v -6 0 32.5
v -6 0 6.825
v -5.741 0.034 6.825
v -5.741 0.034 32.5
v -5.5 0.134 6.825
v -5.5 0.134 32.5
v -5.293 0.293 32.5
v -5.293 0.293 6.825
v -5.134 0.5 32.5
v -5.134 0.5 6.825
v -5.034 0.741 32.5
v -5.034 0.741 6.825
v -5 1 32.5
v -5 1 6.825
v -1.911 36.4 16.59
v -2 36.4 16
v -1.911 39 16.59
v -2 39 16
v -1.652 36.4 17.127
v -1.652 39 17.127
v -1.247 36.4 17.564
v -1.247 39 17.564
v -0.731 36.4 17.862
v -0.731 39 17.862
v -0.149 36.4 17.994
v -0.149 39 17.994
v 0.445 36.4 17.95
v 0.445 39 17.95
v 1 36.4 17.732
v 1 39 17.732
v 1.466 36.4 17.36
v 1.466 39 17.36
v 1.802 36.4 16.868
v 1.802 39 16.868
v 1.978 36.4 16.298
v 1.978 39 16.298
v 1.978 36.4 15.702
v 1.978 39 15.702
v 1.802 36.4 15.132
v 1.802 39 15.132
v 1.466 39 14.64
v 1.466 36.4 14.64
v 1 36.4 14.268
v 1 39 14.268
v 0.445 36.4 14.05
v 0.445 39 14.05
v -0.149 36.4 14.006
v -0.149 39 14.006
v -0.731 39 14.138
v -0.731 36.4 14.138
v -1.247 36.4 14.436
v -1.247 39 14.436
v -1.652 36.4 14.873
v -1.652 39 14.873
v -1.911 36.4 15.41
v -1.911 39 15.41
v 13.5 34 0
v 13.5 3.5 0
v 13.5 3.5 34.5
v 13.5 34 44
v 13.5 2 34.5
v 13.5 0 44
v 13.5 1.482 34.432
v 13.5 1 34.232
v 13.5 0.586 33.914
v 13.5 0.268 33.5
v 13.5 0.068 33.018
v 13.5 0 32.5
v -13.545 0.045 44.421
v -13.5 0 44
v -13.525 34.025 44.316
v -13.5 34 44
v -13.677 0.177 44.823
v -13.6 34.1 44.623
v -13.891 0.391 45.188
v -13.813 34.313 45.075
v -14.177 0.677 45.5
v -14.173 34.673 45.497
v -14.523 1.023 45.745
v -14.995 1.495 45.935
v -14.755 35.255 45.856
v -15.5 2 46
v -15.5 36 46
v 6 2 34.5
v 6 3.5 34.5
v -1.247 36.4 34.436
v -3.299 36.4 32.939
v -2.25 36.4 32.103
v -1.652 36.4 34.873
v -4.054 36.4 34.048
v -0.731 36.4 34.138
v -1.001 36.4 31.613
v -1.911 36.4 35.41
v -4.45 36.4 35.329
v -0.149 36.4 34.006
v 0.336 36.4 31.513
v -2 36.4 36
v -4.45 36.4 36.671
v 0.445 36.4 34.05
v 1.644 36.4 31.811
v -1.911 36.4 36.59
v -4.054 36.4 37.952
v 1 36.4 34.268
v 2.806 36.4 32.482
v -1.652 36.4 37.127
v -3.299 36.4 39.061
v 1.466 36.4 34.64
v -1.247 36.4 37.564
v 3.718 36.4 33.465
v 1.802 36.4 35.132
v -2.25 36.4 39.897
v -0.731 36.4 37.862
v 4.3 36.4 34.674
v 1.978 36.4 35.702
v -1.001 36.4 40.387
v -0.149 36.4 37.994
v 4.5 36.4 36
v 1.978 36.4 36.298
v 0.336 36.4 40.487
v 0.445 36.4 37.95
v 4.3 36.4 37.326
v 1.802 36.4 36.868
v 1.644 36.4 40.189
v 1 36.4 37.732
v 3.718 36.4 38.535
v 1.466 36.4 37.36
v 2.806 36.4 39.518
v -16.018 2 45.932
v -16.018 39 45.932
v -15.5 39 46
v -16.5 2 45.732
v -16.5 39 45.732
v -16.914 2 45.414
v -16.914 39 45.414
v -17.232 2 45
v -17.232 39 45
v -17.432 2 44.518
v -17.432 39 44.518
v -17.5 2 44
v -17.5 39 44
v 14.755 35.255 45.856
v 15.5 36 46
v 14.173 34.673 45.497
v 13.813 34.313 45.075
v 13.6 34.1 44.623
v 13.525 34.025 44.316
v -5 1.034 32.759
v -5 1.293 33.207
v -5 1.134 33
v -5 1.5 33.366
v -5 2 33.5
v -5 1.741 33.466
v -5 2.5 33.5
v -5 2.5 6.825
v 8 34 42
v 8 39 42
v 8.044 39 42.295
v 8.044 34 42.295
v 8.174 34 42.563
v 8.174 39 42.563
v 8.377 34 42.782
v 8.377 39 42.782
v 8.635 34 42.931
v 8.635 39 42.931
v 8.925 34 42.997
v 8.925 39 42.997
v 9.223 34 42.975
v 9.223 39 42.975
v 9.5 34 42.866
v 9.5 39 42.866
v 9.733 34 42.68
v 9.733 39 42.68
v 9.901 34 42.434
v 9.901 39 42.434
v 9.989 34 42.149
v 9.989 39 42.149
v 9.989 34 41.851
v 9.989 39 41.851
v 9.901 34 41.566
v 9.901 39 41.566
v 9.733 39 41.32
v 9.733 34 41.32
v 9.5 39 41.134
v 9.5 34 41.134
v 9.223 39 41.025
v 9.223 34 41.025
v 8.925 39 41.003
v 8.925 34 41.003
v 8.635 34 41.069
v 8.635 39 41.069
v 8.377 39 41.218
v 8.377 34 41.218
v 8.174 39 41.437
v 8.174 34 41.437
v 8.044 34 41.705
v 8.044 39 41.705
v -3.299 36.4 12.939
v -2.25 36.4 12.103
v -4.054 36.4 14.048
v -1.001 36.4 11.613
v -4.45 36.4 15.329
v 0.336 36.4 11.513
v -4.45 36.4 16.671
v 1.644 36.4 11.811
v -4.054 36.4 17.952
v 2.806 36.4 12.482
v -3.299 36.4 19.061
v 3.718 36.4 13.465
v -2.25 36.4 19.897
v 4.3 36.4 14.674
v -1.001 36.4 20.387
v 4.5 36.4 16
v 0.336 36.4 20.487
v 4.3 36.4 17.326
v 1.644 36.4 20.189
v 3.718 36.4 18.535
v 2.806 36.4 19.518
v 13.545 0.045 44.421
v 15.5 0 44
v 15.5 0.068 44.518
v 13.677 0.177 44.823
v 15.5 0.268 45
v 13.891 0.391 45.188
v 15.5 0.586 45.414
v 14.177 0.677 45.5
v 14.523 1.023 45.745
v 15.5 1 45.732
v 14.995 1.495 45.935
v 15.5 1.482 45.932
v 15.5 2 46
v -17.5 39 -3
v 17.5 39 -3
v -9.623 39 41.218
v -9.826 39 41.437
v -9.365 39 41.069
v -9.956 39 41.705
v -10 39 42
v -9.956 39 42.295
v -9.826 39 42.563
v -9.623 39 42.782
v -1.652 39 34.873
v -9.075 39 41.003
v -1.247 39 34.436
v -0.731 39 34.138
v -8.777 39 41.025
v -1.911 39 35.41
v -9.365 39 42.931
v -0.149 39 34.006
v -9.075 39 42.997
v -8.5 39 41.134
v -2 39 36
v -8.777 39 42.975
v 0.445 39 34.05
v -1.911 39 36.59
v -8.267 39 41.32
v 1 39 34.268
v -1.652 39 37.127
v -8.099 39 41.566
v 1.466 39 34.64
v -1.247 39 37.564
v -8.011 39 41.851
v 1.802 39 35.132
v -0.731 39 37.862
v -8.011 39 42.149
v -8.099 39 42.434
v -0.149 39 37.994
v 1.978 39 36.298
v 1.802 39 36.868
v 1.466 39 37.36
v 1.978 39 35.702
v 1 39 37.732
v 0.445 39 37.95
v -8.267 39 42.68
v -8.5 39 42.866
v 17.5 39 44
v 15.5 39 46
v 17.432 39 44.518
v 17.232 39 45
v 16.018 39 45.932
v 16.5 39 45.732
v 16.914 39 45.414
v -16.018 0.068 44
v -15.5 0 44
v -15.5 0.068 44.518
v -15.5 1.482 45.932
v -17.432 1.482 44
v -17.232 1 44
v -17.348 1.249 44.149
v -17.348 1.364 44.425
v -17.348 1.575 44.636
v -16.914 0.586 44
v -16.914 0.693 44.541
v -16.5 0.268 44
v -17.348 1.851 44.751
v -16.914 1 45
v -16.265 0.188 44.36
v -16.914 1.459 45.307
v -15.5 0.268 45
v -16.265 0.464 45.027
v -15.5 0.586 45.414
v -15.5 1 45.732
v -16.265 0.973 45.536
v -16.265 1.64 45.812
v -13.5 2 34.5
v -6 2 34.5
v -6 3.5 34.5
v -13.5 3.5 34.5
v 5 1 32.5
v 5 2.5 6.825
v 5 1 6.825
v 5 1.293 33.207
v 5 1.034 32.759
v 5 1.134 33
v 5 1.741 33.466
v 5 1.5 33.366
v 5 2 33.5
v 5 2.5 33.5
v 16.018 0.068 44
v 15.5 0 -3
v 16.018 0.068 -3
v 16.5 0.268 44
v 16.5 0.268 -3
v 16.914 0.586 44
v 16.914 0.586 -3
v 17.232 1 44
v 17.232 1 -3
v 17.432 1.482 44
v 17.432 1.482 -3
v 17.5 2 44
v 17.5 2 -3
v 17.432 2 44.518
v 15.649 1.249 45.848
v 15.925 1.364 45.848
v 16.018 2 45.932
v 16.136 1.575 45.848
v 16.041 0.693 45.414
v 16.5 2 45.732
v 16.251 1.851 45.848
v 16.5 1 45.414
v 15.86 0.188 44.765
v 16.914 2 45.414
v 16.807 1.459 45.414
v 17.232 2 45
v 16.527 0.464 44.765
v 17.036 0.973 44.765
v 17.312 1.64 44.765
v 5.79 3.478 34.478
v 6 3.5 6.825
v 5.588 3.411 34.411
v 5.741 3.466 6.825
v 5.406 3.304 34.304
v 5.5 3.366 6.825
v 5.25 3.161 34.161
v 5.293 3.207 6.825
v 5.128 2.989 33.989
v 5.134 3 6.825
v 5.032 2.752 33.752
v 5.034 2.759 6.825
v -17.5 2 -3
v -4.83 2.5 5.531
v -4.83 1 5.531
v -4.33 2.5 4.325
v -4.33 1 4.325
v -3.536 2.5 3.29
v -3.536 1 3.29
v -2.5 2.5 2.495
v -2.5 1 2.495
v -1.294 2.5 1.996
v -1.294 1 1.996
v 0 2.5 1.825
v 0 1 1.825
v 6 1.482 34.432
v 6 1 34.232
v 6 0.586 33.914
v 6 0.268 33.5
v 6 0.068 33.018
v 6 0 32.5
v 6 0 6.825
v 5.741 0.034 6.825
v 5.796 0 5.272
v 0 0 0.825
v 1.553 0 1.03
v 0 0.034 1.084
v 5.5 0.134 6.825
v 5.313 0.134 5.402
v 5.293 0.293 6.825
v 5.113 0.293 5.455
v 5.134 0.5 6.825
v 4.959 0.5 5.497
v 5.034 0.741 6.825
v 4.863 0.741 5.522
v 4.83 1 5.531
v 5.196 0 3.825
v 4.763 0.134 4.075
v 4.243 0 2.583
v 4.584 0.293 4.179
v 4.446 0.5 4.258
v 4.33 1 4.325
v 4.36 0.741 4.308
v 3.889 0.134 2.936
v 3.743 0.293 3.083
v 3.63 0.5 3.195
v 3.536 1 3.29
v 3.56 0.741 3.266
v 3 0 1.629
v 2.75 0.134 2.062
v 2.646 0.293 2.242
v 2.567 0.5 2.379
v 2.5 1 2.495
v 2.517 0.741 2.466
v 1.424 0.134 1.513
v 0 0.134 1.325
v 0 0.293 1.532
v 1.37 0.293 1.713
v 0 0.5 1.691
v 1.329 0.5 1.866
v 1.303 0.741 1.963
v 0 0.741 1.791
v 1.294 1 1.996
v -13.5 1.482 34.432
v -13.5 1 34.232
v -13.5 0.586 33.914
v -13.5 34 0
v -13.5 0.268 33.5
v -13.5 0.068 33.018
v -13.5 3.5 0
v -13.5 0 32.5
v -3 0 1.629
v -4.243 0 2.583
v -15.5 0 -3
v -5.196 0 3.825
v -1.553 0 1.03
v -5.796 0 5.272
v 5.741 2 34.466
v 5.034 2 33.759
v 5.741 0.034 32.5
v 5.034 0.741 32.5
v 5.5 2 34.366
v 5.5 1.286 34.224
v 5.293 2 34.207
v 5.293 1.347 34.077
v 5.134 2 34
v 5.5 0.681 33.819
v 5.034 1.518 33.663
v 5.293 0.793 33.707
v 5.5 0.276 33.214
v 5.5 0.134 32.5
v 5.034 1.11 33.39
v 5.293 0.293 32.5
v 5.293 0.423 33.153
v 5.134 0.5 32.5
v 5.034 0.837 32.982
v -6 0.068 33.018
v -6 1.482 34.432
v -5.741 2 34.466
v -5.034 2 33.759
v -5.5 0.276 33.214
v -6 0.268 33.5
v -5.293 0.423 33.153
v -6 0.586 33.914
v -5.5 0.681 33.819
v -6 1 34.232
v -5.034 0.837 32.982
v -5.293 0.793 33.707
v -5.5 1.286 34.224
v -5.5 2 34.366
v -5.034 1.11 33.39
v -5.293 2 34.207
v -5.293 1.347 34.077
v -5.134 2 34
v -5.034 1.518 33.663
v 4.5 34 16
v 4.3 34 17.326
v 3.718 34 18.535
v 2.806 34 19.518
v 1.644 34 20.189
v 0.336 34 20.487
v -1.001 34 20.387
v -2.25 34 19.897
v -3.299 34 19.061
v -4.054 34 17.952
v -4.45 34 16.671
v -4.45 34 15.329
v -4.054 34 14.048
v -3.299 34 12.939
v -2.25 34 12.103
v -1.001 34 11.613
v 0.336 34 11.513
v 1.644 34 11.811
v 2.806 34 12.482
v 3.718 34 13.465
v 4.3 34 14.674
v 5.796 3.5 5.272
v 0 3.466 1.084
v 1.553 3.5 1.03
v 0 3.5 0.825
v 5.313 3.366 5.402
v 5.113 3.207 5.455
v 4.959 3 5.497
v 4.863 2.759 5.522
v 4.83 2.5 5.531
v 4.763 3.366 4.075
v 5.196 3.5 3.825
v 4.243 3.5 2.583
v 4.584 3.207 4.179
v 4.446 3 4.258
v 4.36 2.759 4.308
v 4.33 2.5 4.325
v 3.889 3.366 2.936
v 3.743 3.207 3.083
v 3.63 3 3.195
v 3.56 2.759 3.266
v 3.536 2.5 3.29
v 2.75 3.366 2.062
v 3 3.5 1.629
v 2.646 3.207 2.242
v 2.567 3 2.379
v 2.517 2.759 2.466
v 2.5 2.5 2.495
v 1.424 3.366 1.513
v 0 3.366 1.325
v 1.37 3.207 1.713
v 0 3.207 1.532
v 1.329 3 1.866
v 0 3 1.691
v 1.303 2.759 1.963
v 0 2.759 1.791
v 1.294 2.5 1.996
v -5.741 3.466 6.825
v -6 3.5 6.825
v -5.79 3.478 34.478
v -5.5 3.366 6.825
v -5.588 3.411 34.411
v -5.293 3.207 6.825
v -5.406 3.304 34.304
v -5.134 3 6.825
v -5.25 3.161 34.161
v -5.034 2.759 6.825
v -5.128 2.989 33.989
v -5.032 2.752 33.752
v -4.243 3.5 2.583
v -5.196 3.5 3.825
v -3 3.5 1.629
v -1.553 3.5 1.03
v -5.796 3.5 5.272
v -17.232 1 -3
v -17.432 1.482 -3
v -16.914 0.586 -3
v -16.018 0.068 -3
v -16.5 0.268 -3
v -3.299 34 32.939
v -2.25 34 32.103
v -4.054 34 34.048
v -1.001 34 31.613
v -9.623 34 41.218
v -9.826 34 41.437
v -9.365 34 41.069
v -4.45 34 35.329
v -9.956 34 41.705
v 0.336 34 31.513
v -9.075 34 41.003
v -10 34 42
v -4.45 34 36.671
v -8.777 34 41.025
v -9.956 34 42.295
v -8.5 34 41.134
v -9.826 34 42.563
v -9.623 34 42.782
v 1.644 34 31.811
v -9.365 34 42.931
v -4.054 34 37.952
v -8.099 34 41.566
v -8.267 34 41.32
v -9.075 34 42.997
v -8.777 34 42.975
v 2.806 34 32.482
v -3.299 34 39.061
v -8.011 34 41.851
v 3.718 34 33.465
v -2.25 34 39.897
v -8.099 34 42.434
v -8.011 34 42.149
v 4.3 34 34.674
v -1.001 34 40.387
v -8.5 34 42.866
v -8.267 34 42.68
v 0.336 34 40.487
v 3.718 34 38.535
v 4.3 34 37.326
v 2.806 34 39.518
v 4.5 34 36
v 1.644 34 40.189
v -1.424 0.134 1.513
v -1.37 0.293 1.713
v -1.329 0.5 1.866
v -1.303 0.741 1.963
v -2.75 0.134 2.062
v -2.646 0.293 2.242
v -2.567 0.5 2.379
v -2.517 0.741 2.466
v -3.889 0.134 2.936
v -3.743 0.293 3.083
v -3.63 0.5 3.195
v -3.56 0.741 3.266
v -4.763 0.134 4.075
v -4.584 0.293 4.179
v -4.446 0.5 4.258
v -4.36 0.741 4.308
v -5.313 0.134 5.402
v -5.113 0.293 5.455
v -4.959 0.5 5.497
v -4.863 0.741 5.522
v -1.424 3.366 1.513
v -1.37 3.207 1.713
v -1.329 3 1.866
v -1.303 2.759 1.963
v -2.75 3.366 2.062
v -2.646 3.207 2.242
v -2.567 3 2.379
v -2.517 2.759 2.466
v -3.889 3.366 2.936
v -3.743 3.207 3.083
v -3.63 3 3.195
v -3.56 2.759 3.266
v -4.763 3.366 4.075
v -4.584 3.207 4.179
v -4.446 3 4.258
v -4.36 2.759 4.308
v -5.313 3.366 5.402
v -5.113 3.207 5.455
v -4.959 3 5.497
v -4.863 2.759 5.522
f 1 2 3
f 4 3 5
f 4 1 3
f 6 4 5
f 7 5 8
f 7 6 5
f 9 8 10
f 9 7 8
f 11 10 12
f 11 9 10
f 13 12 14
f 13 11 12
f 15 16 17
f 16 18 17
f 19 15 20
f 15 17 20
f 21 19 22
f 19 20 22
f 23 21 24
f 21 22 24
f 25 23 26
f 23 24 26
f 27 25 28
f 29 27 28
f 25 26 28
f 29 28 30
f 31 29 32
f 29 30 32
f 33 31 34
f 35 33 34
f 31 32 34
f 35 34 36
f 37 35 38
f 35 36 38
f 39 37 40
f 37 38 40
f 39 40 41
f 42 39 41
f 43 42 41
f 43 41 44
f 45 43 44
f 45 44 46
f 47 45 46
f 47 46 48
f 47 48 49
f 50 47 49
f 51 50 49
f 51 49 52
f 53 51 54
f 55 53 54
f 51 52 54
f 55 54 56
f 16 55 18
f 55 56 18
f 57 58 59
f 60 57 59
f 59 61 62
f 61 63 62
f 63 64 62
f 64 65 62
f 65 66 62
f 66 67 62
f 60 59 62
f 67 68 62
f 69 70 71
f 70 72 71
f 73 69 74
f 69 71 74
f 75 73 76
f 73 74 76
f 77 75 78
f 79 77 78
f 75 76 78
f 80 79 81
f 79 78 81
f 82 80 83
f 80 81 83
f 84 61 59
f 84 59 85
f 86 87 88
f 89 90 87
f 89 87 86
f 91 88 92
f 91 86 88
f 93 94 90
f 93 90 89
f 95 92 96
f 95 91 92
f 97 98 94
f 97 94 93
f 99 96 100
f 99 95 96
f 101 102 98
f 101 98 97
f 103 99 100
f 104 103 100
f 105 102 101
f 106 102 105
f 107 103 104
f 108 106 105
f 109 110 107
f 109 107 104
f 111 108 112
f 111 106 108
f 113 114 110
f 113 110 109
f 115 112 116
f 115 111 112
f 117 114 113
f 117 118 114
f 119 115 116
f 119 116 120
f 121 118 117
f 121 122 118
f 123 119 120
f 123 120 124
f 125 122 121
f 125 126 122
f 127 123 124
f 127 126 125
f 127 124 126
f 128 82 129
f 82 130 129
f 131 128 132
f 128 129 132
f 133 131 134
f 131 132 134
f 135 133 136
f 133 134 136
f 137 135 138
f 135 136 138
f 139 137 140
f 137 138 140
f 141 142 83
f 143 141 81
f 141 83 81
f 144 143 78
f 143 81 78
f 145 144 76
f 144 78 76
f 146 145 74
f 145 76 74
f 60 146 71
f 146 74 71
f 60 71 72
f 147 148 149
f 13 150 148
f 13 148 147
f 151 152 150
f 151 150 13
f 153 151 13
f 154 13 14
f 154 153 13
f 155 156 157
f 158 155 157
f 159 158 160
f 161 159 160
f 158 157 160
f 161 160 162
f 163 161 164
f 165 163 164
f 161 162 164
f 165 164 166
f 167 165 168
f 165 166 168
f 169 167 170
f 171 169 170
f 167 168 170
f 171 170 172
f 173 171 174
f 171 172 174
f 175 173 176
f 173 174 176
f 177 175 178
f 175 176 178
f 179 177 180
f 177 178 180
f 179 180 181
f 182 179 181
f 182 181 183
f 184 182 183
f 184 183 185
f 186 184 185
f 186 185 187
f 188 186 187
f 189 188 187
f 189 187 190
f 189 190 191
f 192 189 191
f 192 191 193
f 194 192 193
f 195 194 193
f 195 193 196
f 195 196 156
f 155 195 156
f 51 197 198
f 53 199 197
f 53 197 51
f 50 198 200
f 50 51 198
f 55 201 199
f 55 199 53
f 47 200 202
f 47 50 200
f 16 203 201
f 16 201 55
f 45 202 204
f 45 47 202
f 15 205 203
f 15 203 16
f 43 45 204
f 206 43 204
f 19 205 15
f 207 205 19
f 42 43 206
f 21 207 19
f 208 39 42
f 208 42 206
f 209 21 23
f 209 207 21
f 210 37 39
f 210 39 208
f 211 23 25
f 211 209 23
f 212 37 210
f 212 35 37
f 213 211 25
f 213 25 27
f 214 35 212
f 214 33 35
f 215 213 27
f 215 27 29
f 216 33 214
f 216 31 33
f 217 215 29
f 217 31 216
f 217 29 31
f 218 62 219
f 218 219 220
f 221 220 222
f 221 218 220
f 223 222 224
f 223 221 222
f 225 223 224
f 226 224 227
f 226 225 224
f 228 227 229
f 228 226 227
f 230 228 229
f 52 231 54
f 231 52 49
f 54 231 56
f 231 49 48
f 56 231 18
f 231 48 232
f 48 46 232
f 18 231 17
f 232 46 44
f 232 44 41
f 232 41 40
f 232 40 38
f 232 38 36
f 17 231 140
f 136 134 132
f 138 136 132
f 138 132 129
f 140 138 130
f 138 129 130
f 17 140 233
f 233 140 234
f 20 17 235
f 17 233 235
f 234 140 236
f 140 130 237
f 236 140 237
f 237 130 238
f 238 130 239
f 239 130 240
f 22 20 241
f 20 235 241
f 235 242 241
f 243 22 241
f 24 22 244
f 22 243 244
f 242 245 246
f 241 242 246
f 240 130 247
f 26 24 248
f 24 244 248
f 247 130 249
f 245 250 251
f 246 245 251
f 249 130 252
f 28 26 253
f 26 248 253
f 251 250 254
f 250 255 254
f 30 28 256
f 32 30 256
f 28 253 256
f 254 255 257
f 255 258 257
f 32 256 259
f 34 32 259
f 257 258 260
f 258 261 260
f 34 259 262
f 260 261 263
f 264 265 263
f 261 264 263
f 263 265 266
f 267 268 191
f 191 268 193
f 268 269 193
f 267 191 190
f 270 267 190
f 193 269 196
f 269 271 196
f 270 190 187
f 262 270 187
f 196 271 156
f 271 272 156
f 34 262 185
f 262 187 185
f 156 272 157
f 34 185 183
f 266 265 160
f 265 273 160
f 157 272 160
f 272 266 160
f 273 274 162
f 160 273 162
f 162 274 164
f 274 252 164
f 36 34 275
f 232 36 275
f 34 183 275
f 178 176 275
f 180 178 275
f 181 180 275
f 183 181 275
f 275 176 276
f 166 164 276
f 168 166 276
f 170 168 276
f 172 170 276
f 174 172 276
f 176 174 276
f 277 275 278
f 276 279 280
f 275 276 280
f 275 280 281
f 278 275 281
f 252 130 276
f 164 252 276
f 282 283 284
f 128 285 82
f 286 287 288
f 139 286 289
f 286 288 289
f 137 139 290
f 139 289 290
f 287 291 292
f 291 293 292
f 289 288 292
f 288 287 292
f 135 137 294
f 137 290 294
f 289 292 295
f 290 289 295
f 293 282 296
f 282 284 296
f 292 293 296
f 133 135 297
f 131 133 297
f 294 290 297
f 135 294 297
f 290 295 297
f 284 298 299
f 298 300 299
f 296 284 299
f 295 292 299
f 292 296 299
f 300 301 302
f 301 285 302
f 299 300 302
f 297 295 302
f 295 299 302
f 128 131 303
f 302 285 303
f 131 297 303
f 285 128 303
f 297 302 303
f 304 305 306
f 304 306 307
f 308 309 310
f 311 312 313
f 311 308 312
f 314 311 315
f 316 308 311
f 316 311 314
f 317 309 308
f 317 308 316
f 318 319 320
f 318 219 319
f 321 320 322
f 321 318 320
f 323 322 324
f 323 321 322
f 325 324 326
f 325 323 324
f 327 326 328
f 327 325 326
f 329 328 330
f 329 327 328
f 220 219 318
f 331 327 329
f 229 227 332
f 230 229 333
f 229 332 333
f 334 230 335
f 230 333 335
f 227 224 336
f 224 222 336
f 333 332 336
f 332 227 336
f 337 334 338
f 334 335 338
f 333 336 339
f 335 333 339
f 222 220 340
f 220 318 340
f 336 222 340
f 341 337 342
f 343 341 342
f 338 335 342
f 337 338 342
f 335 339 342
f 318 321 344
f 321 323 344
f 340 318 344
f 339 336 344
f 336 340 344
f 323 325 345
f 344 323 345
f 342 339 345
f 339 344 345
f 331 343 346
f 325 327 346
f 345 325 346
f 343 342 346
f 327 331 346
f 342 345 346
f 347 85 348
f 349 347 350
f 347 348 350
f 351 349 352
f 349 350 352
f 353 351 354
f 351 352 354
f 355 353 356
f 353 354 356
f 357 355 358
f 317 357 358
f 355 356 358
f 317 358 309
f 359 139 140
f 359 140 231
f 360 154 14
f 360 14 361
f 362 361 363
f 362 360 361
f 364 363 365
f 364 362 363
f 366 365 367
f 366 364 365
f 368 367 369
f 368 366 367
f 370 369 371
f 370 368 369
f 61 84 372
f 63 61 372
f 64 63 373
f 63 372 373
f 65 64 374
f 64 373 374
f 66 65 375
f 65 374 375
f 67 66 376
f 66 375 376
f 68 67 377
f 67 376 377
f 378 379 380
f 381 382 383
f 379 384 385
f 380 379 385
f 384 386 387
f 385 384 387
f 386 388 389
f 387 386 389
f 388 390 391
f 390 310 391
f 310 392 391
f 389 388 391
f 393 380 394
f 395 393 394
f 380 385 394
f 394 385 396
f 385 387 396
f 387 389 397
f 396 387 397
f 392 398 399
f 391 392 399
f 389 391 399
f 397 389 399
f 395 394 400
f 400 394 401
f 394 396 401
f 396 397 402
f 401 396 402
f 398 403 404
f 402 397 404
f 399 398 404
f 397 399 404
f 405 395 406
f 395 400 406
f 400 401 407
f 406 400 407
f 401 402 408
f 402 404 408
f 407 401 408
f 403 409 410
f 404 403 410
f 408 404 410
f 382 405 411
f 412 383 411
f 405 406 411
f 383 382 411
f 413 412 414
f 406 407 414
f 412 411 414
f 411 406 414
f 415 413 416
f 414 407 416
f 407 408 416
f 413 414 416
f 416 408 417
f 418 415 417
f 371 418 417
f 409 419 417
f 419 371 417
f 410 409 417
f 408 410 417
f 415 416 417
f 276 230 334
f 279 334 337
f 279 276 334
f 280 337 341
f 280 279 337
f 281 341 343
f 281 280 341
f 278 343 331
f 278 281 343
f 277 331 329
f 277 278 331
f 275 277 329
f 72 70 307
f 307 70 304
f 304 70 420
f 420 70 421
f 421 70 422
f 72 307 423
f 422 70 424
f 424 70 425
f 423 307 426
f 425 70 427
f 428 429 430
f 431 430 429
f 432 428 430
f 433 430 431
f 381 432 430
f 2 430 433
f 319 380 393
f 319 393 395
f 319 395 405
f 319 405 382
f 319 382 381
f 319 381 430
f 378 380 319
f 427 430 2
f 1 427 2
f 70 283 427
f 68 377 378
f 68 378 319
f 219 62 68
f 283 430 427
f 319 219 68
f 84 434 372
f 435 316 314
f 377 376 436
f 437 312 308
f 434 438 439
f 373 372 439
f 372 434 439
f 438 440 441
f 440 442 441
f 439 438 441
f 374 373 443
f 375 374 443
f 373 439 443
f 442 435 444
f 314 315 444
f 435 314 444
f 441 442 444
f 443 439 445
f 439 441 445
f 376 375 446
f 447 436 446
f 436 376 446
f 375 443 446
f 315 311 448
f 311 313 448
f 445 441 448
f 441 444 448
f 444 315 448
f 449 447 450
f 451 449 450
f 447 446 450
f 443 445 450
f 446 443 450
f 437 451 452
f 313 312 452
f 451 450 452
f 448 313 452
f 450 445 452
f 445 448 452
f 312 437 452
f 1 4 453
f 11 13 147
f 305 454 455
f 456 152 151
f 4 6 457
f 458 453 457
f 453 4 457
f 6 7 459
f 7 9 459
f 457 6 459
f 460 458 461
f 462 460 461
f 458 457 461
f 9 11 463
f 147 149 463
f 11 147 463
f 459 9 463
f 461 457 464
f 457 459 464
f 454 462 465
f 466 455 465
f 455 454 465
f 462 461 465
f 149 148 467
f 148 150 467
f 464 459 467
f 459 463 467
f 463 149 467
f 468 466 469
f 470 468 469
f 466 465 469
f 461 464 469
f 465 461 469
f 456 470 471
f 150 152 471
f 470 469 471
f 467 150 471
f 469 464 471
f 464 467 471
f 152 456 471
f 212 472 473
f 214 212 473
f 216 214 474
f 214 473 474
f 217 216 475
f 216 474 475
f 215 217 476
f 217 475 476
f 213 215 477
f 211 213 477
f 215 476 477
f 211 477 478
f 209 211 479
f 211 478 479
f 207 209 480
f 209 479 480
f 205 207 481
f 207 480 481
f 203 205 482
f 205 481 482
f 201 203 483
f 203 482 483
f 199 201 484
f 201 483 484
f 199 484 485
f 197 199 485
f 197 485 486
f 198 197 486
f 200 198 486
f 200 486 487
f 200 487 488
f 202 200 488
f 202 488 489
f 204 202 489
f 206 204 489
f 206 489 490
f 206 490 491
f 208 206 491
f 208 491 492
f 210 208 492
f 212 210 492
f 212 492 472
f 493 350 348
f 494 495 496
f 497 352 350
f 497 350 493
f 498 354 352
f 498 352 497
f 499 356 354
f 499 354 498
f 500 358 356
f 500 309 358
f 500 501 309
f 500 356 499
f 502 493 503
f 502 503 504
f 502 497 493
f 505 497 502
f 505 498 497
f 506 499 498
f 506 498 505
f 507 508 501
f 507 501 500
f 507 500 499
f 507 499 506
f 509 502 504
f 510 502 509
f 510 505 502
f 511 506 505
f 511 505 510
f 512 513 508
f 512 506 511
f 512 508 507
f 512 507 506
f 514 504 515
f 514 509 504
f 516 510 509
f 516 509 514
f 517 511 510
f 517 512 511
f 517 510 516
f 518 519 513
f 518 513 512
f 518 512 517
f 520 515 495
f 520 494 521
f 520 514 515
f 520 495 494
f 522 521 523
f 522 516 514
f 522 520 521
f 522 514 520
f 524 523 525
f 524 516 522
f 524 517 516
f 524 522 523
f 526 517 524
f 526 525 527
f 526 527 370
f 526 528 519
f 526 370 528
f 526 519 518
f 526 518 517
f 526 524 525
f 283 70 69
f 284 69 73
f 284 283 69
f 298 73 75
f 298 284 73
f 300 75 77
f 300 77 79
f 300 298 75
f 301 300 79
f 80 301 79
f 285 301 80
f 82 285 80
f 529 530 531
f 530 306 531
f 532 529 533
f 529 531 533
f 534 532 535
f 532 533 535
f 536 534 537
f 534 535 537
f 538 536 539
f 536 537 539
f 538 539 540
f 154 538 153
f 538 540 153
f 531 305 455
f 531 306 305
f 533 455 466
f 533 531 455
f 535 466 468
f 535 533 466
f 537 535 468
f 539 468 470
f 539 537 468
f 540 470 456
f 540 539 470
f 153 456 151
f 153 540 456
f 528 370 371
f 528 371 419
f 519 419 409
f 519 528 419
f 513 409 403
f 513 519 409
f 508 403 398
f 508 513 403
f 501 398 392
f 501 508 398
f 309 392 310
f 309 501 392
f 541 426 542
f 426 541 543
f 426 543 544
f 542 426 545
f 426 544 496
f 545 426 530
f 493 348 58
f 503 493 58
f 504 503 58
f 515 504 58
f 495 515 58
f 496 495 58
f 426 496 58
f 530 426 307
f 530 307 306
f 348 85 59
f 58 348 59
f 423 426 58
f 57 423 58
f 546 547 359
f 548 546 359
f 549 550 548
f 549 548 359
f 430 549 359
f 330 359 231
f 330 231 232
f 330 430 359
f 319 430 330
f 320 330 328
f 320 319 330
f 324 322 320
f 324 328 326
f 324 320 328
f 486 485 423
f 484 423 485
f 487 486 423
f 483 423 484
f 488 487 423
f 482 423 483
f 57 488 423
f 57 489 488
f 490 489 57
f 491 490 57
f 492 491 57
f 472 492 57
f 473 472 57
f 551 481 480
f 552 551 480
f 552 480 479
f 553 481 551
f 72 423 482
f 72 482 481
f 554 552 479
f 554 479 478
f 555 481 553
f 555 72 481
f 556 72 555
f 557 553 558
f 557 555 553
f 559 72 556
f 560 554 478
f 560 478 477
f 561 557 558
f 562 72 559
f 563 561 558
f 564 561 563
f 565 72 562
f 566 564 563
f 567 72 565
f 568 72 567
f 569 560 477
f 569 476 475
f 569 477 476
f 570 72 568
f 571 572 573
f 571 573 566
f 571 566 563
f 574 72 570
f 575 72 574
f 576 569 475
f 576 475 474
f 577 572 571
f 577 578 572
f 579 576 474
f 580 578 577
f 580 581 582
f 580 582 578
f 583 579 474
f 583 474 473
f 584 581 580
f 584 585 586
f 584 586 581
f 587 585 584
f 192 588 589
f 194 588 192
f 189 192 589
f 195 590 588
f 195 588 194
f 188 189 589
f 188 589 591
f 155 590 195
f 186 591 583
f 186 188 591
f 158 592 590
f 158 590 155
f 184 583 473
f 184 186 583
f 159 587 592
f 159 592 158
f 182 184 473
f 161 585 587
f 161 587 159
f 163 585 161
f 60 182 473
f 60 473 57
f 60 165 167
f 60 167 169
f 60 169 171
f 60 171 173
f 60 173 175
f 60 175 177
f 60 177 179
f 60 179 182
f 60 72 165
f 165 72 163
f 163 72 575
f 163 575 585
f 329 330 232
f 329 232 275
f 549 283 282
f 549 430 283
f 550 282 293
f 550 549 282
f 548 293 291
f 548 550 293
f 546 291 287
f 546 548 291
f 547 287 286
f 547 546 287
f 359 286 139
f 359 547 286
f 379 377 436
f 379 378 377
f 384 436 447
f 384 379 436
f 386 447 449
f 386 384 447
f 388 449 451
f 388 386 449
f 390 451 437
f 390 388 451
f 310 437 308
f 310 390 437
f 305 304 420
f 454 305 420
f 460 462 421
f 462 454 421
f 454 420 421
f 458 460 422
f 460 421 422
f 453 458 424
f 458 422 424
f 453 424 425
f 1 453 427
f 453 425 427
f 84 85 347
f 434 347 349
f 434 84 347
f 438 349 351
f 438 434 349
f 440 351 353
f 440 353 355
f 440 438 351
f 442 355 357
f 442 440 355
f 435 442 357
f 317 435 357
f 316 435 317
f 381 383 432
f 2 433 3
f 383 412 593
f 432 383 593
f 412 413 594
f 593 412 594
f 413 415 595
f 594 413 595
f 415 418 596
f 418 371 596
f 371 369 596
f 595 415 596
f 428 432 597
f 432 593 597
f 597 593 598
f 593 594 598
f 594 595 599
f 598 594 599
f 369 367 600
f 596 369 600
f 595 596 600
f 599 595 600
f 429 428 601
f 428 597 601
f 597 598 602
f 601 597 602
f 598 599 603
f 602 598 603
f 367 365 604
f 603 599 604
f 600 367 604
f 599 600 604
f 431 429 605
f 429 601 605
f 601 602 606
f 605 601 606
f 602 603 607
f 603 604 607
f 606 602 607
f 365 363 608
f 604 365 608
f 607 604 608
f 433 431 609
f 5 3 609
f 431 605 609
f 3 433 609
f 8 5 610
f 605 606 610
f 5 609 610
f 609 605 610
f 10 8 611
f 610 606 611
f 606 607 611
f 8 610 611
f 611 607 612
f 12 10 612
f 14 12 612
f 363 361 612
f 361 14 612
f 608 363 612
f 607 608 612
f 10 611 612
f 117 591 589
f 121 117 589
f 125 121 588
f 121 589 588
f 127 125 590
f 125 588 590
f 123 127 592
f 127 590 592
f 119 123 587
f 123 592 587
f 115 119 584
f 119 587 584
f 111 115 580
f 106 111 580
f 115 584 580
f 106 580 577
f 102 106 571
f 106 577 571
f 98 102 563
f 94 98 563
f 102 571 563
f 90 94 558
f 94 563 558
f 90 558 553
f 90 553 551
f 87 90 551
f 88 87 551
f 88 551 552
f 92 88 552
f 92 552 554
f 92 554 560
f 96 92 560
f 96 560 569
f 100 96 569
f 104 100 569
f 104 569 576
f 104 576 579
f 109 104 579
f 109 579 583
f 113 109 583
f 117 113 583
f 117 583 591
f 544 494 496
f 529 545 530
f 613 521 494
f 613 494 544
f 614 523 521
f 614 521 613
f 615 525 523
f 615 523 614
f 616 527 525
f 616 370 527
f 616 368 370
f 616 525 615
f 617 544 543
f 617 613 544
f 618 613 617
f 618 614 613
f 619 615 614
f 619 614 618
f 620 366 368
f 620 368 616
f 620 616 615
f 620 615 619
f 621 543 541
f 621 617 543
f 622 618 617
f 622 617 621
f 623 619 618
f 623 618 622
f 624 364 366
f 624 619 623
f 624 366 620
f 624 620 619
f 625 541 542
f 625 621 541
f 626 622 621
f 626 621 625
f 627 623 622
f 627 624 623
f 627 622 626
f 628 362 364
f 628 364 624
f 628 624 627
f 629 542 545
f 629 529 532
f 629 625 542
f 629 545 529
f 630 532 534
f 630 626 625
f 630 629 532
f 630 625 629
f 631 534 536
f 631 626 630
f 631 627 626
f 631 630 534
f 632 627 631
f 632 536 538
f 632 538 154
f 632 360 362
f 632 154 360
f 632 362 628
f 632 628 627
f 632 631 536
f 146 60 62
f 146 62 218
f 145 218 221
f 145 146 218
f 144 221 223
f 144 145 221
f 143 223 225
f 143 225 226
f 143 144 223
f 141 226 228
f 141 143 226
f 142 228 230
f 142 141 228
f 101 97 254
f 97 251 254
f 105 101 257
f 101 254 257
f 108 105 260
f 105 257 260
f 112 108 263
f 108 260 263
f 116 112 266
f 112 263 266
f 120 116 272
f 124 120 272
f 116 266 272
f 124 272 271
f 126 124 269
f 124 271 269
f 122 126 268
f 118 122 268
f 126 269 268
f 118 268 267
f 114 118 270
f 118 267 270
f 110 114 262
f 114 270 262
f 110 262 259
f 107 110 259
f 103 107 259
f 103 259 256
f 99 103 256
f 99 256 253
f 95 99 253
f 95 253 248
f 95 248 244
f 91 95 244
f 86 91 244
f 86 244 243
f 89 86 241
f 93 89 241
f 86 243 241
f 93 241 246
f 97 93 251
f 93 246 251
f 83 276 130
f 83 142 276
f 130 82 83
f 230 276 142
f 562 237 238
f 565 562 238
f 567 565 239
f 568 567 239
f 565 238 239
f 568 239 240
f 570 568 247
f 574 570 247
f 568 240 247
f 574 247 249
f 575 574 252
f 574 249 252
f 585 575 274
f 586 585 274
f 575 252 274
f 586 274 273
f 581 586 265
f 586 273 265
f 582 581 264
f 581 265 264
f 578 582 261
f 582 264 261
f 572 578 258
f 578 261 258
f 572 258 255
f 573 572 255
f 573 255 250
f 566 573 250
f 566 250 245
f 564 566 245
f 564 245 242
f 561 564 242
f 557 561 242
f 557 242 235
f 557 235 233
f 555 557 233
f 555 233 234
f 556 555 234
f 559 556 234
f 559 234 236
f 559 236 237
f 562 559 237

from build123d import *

# Parameters (mm, degrees)
F0_W           = 9
F0_H           = 7.5
F0_W_2         = 13.5
F0_H_2         = 34.5
F1_DEPTH       = 39
F2_DEPTH       = 34
F3_D           = 2
F3_DEPTH       = 40
F3_START       = 34
F3_TIP         = 0.600860619
F4_DEPTH       = 3.5
F5_R           = 1.99999
F7_D           = 4
F7_DEPTH       = 10
F7_CBORE_D     = 9
F7_CBORE_DEPTH = 2.4
F7_TIP         = 1.2017212381
F8_DEPTH       = 50
F9_R           = 1


# Not quite as in the source:
# - a fillet or chamfer is up to 0.001 mm smaller than in the source, because OpenCascade refuses the exact size


with BuildPart() as f1:
    # F0 (on Front) → F1 (new body)
    with BuildSketch(Plane.XZ):
        Polygon((13.5, 0), (0, 0), (-13.5, 0), (-13.5, 34.5), (-13.5, 36), (-13.5, 46), (-17.5, 46), (-17.5, 0), (-17.5, -3), (-13.5, -3), (13.5, -3), align=None)
        Polygon((13.5, 34.5), (13.5, 0), (13.5, -3), (17.5, -3), (17.5, 0), (17.5, 46), (13.5, 46), align=None)
        Polygon((-13.5, 0), (0, 0), (0, 34.5), (-9, 34.5), (-13.5, 34.5), align=None)
        Polygon((0, 42), (0, 34.5), (13.5, 34.5), (13.5, 46), (-13.5, 46), (-13.5, 36), (-13.5, 34.5), (-9, 34.5), (-9, 42), align=None)
        with Locations((-4.5, 38.25)):
            Rectangle(F0_W, F0_H)
        with Locations((6.75, 17.25)):
            Rectangle(F0_W_2, F0_H_2)
    extrude(amount=-F1_DEPTH)

    # F0 (on Front) → F2 (cut)
    with BuildSketch(Plane.XZ):
        Polygon((-13.5, 0), (0, 0), (0, 34.5), (-9, 34.5), (-13.5, 34.5), align=None)
        with Locations((6.75, 17.25)):
            Rectangle(F0_W_2, F0_H_2)
        Polygon((0, 42), (0, 34.5), (13.5, 34.5), (13.5, 46), (-13.5, 46), (-13.5, 36), (-13.5, 34.5), (-9, 34.5), (-9, 42), align=None)
        with Locations((-4.5, 38.25)):
            Rectangle(F0_W, F0_H)
    extrude(amount=-F2_DEPTH, mode=Mode.SUBTRACT)

    # F3
    # its depths count from where the whole tool has entered the part; down to there all is cleared
    with Locations(Plane.XZ.offset(-F3_START)):
        with Locations((-9, 42), (9, 42)):
            Hole(F3_D / 2, depth=F3_DEPTH)
            with Locations((0, 0, -(F3_DEPTH + F3_TIP / 2))):  # 118° drill point
                Cone(0, F3_D / 2, F3_TIP, mode=Mode.SUBTRACT)

    # F0 (on Front) → F4 (join)
    with BuildSketch(Plane.XZ):
        Polygon((-13.5, 0), (0, 0), (0, 34.5), (-9, 34.5), (-13.5, 34.5), align=None)
        with Locations((6.75, 17.25)):
            Rectangle(F0_W_2, F0_H_2)
    extrude(amount=-F4_DEPTH)

    # F5 (radius 2 in the source; OpenCascade refuses exactly that, so slightly less here)
    f5_edges = [f1.edges().sort_by_distance(p)[0] for p in [
        (-15.5, 0, 46),
        (-17.5, 0, 21.5),
        (17.5, 0, 21.5),
        (15.5, 0, 46),
        (-17.5, 19.5, 46),
        (17.5, 19.5, 46),
        (0, 34, 46),
        (13.5, 17, 46),
        (-13.5, 17, 46),
        (0, 0, 34.5),
    ]]
    fillet(f5_edges, radius=F5_R)

    # F7
    with Locations(Plane.XZ.offset(-34)):
        with Locations((0, 36), (0, 16)):
            CounterBoreHole(F7_D / 2, F7_CBORE_D / 2, F7_CBORE_DEPTH, depth=F7_DEPTH)
            with Locations((0, 0, -(F7_DEPTH + F7_TIP / 2))):  # 118° drill point
                Cone(0, F7_D / 2, F7_TIP, mode=Mode.SUBTRACT)

    # F6 (on face) → F8 (cut)
    with BuildSketch(Plane.XZ.offset(-34)):
        with BuildLine():
            ThreePointArc((-5, 6.8252934143), (-3.5355339059, 3.2897595084), (0, 1.8252934143))
            Line((0, 1.8252934143), (0, 6.8252934143))
            Line((0, 6.8252934143), (-5, 6.8252934143))
        make_face()
        with BuildLine():
            Line((0, 6.8252934143), (0, 1.8252934143))
            ThreePointArc((0, 1.8252934143), (3.5355339059, 3.2897595084), (5, 6.8252934143))
            ThreePointArc((5, 6.8252934143), (3.5355339059, 10.3608273202), (0, 11.8252934143))
            Line((0, 11.8252934143), (0, 6.8252934143))
        make_face()
        with BuildLine():
            Line((-5, 6.8252934143), (0, 6.8252934143))
            Line((0, 6.8252934143), (0, 11.8252934143))
            ThreePointArc((0, 11.8252934143), (-3.5355339059, 10.3608273202), (-5, 6.8252934143))
        make_face()
        with BuildLine():
            Line((-5, 35.0794121623), (-5, 6.8252934143))
            ThreePointArc((-5, 6.8252934143), (-3.5355339059, 10.3608273202), (0, 11.8252934143))
            Line((0, 11.8252934143), (0, 16))
            Line((0, 16), (0, 35.0794121623))
            Line((0, 35.0794121623), (-5, 35.0794121623))
        make_face()
        with BuildLine():
            ThreePointArc((0, 11.8252934143), (3.5355339059, 10.3608273202), (5, 6.8252934143))
            Line((5, 6.8252934143), (5, 35.0794121623))
            Line((5, 35.0794121623), (0, 35.0794121623))
            Line((0, 35.0794121623), (0, 16))
            Line((0, 16), (0, 11.8252934143))
        make_face()
    extrude(amount=F8_DEPTH, mode=Mode.SUBTRACT)

    # F9
    f9_edges = [f1.edges().sort_by_distance(p)[0] for p in [
        (5, 3.5, 20.662647),
        (5, 0, 19.662652),
        (0, 3.5, 1.825293),
    ]]
    fillet(f9_edges, radius=F9_R)


solid = f1.part
